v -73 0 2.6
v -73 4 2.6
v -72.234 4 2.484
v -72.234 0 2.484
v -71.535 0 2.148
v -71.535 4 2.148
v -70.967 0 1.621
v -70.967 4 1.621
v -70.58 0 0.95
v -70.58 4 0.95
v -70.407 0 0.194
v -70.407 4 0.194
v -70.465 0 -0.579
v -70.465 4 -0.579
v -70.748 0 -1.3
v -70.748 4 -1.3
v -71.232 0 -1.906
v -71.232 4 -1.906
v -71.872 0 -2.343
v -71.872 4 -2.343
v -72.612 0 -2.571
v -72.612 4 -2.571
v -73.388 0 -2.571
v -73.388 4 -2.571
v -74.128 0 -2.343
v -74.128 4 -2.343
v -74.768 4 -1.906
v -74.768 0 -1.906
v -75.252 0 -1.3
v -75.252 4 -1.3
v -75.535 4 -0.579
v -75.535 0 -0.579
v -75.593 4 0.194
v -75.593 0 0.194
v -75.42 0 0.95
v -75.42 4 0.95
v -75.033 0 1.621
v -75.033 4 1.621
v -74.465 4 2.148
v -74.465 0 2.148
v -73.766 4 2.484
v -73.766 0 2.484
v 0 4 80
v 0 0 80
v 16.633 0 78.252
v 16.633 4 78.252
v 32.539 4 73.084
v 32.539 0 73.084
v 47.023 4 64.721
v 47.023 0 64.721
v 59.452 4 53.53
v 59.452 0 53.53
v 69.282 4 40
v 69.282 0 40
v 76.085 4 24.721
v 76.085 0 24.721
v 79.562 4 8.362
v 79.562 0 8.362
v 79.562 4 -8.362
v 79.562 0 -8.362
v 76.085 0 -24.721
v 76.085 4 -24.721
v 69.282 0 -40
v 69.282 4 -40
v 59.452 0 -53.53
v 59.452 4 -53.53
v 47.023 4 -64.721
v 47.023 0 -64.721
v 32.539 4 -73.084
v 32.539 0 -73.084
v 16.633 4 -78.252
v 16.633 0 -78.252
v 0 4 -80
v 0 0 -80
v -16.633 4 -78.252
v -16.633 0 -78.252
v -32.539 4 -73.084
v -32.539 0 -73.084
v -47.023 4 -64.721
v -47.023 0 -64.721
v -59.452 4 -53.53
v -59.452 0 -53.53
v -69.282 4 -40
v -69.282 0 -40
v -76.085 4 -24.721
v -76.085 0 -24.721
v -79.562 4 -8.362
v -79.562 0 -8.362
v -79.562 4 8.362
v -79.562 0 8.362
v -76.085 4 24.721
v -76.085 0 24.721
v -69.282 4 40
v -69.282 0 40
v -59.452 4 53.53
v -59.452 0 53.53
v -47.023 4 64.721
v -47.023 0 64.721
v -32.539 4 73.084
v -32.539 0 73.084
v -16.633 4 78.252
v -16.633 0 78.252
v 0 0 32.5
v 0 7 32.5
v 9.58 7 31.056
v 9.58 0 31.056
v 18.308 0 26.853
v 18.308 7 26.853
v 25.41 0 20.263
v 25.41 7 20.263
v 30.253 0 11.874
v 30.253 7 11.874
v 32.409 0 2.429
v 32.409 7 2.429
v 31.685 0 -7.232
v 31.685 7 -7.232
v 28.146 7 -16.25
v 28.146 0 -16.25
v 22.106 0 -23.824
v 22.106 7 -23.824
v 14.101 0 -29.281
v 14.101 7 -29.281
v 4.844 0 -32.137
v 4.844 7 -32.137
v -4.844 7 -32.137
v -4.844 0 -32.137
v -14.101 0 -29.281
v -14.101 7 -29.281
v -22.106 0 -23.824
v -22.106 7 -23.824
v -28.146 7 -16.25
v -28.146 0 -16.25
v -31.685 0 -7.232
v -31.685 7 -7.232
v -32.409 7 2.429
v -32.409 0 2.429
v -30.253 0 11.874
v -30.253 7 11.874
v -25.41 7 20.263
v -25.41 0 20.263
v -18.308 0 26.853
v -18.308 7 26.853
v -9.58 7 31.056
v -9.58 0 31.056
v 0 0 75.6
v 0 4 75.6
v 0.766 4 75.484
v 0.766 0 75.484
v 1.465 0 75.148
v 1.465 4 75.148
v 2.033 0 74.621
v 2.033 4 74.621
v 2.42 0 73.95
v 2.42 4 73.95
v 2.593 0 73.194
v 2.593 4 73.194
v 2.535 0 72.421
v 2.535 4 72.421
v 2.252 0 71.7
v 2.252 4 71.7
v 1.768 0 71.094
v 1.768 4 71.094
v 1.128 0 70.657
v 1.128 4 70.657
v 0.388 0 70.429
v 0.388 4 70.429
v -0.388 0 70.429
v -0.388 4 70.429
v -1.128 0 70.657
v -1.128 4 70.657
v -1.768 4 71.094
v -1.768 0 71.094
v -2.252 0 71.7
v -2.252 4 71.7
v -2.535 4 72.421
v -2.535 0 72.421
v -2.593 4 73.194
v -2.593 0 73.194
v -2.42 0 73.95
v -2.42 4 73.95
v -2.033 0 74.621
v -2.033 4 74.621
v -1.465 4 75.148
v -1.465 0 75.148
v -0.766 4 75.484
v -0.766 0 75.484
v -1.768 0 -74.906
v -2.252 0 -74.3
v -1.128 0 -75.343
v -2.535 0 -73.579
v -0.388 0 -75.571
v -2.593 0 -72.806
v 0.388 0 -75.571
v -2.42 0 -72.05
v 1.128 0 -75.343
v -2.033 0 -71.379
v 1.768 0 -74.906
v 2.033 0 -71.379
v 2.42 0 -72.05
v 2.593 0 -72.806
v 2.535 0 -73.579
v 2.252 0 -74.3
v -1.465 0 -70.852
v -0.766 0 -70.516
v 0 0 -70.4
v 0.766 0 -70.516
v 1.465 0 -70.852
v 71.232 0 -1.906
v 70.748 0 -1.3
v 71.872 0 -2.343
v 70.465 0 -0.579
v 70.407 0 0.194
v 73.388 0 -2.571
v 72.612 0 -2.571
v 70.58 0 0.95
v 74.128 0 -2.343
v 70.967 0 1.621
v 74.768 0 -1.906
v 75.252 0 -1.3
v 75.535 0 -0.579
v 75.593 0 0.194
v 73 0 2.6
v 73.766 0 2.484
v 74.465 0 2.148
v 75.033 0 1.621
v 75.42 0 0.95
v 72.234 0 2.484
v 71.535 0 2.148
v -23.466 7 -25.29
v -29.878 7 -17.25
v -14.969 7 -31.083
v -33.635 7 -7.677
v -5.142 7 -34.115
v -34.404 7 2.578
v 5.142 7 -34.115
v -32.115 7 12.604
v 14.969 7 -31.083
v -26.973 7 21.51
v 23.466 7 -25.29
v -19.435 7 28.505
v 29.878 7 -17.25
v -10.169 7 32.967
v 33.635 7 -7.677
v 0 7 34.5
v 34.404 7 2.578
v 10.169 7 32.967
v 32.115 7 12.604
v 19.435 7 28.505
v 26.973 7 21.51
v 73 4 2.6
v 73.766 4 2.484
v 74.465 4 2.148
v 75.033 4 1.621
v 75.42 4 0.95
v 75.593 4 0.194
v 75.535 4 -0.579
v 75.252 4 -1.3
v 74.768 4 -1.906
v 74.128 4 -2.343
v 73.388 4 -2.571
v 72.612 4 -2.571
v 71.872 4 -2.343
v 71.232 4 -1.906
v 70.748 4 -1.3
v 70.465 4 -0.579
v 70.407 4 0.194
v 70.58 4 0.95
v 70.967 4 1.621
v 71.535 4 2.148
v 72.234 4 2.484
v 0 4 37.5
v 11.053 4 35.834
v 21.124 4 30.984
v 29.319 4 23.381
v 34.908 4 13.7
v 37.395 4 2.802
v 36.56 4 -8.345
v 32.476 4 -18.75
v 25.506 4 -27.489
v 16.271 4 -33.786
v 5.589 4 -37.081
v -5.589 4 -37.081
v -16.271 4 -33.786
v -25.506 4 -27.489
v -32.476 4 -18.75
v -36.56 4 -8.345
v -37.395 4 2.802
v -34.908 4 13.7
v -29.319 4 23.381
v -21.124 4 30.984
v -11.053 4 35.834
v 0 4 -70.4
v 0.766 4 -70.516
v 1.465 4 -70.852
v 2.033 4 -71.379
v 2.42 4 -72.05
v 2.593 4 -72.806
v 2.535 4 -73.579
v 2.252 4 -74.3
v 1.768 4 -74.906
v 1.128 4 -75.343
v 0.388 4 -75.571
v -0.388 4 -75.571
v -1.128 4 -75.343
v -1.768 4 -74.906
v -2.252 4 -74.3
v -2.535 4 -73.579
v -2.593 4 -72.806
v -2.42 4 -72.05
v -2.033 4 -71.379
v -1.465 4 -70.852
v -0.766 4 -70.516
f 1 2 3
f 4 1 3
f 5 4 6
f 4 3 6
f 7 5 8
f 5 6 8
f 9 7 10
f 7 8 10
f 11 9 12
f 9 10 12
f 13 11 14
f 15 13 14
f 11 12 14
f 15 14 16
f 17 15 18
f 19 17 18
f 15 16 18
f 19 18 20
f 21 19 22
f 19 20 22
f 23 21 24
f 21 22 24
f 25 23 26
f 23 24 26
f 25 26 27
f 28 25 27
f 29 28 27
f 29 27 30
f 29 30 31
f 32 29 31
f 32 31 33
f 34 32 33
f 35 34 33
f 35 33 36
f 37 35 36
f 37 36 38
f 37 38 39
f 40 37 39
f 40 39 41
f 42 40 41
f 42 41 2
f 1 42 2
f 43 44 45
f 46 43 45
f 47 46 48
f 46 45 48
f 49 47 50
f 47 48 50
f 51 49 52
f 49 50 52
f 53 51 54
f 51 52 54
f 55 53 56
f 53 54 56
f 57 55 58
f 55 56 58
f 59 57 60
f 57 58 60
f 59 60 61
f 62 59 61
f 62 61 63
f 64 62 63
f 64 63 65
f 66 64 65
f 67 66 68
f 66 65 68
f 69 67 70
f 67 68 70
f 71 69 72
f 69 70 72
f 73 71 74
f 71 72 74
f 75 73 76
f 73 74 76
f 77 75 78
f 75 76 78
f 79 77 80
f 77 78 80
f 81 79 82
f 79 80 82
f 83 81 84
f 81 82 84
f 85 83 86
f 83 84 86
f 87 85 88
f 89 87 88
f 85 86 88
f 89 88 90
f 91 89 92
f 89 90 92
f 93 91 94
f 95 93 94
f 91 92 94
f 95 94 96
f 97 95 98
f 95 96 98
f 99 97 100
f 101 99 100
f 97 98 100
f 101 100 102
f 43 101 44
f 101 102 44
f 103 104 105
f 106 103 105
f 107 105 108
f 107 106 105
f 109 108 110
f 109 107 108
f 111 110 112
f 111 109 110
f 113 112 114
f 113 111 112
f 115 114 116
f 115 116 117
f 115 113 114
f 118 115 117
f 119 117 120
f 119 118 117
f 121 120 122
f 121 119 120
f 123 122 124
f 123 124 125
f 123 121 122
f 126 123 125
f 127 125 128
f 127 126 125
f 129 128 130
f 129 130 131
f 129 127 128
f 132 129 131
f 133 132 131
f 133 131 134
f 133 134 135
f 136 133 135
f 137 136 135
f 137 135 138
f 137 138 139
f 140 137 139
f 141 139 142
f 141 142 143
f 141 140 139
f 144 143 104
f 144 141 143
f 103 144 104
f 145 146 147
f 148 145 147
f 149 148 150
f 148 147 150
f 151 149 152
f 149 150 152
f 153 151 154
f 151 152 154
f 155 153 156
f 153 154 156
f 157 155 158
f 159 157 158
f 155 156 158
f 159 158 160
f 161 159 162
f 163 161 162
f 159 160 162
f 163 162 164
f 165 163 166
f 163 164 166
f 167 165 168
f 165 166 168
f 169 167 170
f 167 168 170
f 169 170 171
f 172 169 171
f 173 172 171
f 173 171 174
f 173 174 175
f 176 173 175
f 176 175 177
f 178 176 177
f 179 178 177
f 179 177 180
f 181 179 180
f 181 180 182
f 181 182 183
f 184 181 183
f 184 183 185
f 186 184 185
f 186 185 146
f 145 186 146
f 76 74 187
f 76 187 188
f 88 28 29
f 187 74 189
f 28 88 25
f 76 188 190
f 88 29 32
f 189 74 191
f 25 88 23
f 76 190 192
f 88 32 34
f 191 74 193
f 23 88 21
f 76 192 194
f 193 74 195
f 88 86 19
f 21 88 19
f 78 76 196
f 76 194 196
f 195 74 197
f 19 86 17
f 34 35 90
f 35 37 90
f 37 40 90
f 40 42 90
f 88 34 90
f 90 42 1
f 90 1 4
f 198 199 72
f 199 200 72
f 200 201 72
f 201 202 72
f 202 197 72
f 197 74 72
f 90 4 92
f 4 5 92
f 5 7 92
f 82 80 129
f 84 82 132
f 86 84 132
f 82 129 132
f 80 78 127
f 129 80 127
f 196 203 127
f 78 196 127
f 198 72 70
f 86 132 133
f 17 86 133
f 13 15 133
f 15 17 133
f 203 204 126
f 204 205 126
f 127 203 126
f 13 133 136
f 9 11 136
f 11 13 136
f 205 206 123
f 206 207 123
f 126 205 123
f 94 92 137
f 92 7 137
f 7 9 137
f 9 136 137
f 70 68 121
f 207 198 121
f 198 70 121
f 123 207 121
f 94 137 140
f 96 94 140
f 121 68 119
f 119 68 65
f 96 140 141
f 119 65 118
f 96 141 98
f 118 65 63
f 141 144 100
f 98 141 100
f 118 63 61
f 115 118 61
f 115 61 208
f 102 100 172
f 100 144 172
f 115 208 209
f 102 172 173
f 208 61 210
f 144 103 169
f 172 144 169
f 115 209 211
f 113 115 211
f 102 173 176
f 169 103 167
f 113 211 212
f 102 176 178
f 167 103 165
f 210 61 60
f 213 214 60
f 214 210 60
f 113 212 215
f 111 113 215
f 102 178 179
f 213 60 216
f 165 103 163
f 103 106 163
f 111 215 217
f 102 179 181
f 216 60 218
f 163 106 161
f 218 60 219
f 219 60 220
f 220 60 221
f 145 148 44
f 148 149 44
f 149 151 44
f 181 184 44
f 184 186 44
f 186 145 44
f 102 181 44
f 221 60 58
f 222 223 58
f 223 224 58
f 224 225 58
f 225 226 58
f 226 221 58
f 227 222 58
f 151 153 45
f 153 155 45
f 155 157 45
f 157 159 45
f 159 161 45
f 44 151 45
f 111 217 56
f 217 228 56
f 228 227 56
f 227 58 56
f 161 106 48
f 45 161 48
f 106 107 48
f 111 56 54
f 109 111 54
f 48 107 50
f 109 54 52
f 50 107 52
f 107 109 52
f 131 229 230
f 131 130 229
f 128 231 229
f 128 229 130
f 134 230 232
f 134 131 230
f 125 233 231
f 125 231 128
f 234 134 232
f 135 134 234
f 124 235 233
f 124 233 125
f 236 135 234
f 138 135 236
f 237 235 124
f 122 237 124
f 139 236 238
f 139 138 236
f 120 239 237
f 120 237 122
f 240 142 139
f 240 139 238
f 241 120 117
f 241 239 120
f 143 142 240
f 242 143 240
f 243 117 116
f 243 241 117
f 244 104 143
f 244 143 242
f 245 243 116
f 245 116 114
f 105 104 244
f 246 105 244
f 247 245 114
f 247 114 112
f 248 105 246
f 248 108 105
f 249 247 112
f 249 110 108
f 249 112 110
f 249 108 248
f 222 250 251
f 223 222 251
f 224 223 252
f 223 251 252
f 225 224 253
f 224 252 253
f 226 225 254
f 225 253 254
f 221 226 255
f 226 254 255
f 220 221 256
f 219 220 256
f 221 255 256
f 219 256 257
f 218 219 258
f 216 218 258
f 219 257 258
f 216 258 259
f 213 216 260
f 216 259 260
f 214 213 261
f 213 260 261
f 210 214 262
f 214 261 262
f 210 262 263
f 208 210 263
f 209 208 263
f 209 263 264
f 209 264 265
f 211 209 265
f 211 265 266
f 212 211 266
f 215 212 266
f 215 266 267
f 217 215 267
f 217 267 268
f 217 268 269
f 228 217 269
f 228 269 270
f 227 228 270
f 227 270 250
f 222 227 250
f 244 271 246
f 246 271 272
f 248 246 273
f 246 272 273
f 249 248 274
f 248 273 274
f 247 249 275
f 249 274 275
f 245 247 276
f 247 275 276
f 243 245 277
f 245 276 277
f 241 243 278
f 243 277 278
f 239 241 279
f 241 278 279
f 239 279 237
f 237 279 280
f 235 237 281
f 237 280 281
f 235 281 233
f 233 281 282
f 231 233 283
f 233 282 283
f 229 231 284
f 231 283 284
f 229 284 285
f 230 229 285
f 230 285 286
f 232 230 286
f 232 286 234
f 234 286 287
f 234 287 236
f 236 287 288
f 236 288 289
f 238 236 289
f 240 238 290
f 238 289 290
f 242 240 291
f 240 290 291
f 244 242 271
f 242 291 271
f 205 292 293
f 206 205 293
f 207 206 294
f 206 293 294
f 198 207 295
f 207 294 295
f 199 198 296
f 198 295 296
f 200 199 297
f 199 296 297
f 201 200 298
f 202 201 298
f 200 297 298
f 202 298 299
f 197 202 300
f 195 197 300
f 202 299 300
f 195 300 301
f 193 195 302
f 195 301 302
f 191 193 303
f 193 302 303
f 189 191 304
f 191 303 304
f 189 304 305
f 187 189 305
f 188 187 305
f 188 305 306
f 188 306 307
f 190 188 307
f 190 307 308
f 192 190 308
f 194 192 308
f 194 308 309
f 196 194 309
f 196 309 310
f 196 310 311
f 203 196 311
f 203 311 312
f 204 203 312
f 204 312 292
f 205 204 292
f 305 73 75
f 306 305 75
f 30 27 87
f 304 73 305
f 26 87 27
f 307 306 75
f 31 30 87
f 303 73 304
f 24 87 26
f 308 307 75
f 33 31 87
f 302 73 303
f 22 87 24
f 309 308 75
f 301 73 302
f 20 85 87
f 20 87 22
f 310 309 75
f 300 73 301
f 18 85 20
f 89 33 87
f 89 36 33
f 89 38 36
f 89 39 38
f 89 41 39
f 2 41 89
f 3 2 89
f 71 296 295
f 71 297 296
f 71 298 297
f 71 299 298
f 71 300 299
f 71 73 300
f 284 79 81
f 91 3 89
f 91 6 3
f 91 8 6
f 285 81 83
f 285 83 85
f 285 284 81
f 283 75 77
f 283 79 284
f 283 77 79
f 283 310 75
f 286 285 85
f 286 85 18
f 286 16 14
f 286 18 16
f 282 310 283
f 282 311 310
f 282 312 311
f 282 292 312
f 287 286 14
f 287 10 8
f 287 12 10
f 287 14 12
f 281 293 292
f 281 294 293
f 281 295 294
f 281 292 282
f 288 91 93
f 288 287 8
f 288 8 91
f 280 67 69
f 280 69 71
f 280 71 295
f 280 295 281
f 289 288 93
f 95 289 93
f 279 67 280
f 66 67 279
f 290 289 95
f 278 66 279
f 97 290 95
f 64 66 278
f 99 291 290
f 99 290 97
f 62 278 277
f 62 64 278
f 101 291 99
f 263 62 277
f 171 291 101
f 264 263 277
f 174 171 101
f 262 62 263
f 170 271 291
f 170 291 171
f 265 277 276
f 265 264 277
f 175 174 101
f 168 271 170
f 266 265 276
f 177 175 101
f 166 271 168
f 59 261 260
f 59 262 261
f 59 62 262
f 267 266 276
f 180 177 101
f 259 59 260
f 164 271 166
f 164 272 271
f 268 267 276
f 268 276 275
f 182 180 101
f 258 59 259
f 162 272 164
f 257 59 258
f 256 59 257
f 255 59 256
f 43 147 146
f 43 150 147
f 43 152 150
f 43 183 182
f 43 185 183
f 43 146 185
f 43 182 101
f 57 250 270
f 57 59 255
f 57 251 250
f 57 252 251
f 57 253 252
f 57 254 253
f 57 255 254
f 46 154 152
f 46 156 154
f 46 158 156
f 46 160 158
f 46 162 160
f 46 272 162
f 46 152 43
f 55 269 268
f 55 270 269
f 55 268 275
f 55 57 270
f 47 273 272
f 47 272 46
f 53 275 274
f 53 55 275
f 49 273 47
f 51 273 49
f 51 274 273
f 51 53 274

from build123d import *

# Parameters (mm, degrees)
SKETCH1_R           = 80
SKETCH1_R_2         = 32.5
BOSS_EXTRUDE1_DEPTH = 4
SKETCH2_R           = 2.6
CUT_EXTRUDE1_DEPTH  = 114.207773585
SKETCH3_R           = 34.5
SKETCH3_R_2         = 32.5
BOSS_EXTRUDE2_DEPTH = 3
CHAMFER1_SIZE       = 3


with BuildPart() as part:
    # Sketch1 → Boss-Extrude1 (new body)
    with BuildSketch(Plane(origin=(0, 0, 0), x_dir=(1, 0, 0), z_dir=(0, 1, 0))):
        with Locations(Location((0, 0, 0), (0, 0, 270))):
            Circle(SKETCH1_R)
        with Locations(Location((0, 0, 0), (0, 0, 270))):
            Circle(SKETCH1_R_2, mode=Mode.SUBTRACT)
    extrude(amount=BOSS_EXTRUDE1_DEPTH)

    # Sketch2 → Cut-Extrude1 (cut, through all)
    with BuildSketch(Plane(origin=(0, 4, 0), x_dir=(1, 0, 0), z_dir=(0, 1, 0))):
        with Locations(Location((0, 73, 0), (0, 0, 270))):
            Circle(SKETCH2_R)
        with Locations(Location((73, 0, 0), (0, 0, 270))):
            Circle(SKETCH2_R)
        with Locations(Location((0, -73, 0), (0, 0, 270))):
            Circle(SKETCH2_R)
        with Locations(Location((-73, 0, 0), (0, 0, 270))):
            Circle(SKETCH2_R)
    extrude(amount=-CUT_EXTRUDE1_DEPTH, mode=Mode.SUBTRACT)

    # Sketch3 → Boss-Extrude2 (add)
    with BuildSketch(Plane(origin=(0, 4, 0), x_dir=(1, 0, 0), z_dir=(0, 1, 0))):
        with Locations(Location((0, 0, 0), (0, 0, 270))):
            Circle(SKETCH3_R)
        with Locations(Location((0, 0, 0), (0, 0, 270))):
            Circle(SKETCH3_R_2, mode=Mode.SUBTRACT)
    extrude(amount=BOSS_EXTRUDE2_DEPTH)

    # Chamfer1
    chamfer1_edges = [part.edges().sort_by_distance(p)[0] for p in [
        (0, 4, -34.5),
    ]]
    chamfer(chamfer1_edges, length=CHAMFER1_SIZE - 0.0001)  # a hair under: the kernel refuses the full size


solid = part.part
